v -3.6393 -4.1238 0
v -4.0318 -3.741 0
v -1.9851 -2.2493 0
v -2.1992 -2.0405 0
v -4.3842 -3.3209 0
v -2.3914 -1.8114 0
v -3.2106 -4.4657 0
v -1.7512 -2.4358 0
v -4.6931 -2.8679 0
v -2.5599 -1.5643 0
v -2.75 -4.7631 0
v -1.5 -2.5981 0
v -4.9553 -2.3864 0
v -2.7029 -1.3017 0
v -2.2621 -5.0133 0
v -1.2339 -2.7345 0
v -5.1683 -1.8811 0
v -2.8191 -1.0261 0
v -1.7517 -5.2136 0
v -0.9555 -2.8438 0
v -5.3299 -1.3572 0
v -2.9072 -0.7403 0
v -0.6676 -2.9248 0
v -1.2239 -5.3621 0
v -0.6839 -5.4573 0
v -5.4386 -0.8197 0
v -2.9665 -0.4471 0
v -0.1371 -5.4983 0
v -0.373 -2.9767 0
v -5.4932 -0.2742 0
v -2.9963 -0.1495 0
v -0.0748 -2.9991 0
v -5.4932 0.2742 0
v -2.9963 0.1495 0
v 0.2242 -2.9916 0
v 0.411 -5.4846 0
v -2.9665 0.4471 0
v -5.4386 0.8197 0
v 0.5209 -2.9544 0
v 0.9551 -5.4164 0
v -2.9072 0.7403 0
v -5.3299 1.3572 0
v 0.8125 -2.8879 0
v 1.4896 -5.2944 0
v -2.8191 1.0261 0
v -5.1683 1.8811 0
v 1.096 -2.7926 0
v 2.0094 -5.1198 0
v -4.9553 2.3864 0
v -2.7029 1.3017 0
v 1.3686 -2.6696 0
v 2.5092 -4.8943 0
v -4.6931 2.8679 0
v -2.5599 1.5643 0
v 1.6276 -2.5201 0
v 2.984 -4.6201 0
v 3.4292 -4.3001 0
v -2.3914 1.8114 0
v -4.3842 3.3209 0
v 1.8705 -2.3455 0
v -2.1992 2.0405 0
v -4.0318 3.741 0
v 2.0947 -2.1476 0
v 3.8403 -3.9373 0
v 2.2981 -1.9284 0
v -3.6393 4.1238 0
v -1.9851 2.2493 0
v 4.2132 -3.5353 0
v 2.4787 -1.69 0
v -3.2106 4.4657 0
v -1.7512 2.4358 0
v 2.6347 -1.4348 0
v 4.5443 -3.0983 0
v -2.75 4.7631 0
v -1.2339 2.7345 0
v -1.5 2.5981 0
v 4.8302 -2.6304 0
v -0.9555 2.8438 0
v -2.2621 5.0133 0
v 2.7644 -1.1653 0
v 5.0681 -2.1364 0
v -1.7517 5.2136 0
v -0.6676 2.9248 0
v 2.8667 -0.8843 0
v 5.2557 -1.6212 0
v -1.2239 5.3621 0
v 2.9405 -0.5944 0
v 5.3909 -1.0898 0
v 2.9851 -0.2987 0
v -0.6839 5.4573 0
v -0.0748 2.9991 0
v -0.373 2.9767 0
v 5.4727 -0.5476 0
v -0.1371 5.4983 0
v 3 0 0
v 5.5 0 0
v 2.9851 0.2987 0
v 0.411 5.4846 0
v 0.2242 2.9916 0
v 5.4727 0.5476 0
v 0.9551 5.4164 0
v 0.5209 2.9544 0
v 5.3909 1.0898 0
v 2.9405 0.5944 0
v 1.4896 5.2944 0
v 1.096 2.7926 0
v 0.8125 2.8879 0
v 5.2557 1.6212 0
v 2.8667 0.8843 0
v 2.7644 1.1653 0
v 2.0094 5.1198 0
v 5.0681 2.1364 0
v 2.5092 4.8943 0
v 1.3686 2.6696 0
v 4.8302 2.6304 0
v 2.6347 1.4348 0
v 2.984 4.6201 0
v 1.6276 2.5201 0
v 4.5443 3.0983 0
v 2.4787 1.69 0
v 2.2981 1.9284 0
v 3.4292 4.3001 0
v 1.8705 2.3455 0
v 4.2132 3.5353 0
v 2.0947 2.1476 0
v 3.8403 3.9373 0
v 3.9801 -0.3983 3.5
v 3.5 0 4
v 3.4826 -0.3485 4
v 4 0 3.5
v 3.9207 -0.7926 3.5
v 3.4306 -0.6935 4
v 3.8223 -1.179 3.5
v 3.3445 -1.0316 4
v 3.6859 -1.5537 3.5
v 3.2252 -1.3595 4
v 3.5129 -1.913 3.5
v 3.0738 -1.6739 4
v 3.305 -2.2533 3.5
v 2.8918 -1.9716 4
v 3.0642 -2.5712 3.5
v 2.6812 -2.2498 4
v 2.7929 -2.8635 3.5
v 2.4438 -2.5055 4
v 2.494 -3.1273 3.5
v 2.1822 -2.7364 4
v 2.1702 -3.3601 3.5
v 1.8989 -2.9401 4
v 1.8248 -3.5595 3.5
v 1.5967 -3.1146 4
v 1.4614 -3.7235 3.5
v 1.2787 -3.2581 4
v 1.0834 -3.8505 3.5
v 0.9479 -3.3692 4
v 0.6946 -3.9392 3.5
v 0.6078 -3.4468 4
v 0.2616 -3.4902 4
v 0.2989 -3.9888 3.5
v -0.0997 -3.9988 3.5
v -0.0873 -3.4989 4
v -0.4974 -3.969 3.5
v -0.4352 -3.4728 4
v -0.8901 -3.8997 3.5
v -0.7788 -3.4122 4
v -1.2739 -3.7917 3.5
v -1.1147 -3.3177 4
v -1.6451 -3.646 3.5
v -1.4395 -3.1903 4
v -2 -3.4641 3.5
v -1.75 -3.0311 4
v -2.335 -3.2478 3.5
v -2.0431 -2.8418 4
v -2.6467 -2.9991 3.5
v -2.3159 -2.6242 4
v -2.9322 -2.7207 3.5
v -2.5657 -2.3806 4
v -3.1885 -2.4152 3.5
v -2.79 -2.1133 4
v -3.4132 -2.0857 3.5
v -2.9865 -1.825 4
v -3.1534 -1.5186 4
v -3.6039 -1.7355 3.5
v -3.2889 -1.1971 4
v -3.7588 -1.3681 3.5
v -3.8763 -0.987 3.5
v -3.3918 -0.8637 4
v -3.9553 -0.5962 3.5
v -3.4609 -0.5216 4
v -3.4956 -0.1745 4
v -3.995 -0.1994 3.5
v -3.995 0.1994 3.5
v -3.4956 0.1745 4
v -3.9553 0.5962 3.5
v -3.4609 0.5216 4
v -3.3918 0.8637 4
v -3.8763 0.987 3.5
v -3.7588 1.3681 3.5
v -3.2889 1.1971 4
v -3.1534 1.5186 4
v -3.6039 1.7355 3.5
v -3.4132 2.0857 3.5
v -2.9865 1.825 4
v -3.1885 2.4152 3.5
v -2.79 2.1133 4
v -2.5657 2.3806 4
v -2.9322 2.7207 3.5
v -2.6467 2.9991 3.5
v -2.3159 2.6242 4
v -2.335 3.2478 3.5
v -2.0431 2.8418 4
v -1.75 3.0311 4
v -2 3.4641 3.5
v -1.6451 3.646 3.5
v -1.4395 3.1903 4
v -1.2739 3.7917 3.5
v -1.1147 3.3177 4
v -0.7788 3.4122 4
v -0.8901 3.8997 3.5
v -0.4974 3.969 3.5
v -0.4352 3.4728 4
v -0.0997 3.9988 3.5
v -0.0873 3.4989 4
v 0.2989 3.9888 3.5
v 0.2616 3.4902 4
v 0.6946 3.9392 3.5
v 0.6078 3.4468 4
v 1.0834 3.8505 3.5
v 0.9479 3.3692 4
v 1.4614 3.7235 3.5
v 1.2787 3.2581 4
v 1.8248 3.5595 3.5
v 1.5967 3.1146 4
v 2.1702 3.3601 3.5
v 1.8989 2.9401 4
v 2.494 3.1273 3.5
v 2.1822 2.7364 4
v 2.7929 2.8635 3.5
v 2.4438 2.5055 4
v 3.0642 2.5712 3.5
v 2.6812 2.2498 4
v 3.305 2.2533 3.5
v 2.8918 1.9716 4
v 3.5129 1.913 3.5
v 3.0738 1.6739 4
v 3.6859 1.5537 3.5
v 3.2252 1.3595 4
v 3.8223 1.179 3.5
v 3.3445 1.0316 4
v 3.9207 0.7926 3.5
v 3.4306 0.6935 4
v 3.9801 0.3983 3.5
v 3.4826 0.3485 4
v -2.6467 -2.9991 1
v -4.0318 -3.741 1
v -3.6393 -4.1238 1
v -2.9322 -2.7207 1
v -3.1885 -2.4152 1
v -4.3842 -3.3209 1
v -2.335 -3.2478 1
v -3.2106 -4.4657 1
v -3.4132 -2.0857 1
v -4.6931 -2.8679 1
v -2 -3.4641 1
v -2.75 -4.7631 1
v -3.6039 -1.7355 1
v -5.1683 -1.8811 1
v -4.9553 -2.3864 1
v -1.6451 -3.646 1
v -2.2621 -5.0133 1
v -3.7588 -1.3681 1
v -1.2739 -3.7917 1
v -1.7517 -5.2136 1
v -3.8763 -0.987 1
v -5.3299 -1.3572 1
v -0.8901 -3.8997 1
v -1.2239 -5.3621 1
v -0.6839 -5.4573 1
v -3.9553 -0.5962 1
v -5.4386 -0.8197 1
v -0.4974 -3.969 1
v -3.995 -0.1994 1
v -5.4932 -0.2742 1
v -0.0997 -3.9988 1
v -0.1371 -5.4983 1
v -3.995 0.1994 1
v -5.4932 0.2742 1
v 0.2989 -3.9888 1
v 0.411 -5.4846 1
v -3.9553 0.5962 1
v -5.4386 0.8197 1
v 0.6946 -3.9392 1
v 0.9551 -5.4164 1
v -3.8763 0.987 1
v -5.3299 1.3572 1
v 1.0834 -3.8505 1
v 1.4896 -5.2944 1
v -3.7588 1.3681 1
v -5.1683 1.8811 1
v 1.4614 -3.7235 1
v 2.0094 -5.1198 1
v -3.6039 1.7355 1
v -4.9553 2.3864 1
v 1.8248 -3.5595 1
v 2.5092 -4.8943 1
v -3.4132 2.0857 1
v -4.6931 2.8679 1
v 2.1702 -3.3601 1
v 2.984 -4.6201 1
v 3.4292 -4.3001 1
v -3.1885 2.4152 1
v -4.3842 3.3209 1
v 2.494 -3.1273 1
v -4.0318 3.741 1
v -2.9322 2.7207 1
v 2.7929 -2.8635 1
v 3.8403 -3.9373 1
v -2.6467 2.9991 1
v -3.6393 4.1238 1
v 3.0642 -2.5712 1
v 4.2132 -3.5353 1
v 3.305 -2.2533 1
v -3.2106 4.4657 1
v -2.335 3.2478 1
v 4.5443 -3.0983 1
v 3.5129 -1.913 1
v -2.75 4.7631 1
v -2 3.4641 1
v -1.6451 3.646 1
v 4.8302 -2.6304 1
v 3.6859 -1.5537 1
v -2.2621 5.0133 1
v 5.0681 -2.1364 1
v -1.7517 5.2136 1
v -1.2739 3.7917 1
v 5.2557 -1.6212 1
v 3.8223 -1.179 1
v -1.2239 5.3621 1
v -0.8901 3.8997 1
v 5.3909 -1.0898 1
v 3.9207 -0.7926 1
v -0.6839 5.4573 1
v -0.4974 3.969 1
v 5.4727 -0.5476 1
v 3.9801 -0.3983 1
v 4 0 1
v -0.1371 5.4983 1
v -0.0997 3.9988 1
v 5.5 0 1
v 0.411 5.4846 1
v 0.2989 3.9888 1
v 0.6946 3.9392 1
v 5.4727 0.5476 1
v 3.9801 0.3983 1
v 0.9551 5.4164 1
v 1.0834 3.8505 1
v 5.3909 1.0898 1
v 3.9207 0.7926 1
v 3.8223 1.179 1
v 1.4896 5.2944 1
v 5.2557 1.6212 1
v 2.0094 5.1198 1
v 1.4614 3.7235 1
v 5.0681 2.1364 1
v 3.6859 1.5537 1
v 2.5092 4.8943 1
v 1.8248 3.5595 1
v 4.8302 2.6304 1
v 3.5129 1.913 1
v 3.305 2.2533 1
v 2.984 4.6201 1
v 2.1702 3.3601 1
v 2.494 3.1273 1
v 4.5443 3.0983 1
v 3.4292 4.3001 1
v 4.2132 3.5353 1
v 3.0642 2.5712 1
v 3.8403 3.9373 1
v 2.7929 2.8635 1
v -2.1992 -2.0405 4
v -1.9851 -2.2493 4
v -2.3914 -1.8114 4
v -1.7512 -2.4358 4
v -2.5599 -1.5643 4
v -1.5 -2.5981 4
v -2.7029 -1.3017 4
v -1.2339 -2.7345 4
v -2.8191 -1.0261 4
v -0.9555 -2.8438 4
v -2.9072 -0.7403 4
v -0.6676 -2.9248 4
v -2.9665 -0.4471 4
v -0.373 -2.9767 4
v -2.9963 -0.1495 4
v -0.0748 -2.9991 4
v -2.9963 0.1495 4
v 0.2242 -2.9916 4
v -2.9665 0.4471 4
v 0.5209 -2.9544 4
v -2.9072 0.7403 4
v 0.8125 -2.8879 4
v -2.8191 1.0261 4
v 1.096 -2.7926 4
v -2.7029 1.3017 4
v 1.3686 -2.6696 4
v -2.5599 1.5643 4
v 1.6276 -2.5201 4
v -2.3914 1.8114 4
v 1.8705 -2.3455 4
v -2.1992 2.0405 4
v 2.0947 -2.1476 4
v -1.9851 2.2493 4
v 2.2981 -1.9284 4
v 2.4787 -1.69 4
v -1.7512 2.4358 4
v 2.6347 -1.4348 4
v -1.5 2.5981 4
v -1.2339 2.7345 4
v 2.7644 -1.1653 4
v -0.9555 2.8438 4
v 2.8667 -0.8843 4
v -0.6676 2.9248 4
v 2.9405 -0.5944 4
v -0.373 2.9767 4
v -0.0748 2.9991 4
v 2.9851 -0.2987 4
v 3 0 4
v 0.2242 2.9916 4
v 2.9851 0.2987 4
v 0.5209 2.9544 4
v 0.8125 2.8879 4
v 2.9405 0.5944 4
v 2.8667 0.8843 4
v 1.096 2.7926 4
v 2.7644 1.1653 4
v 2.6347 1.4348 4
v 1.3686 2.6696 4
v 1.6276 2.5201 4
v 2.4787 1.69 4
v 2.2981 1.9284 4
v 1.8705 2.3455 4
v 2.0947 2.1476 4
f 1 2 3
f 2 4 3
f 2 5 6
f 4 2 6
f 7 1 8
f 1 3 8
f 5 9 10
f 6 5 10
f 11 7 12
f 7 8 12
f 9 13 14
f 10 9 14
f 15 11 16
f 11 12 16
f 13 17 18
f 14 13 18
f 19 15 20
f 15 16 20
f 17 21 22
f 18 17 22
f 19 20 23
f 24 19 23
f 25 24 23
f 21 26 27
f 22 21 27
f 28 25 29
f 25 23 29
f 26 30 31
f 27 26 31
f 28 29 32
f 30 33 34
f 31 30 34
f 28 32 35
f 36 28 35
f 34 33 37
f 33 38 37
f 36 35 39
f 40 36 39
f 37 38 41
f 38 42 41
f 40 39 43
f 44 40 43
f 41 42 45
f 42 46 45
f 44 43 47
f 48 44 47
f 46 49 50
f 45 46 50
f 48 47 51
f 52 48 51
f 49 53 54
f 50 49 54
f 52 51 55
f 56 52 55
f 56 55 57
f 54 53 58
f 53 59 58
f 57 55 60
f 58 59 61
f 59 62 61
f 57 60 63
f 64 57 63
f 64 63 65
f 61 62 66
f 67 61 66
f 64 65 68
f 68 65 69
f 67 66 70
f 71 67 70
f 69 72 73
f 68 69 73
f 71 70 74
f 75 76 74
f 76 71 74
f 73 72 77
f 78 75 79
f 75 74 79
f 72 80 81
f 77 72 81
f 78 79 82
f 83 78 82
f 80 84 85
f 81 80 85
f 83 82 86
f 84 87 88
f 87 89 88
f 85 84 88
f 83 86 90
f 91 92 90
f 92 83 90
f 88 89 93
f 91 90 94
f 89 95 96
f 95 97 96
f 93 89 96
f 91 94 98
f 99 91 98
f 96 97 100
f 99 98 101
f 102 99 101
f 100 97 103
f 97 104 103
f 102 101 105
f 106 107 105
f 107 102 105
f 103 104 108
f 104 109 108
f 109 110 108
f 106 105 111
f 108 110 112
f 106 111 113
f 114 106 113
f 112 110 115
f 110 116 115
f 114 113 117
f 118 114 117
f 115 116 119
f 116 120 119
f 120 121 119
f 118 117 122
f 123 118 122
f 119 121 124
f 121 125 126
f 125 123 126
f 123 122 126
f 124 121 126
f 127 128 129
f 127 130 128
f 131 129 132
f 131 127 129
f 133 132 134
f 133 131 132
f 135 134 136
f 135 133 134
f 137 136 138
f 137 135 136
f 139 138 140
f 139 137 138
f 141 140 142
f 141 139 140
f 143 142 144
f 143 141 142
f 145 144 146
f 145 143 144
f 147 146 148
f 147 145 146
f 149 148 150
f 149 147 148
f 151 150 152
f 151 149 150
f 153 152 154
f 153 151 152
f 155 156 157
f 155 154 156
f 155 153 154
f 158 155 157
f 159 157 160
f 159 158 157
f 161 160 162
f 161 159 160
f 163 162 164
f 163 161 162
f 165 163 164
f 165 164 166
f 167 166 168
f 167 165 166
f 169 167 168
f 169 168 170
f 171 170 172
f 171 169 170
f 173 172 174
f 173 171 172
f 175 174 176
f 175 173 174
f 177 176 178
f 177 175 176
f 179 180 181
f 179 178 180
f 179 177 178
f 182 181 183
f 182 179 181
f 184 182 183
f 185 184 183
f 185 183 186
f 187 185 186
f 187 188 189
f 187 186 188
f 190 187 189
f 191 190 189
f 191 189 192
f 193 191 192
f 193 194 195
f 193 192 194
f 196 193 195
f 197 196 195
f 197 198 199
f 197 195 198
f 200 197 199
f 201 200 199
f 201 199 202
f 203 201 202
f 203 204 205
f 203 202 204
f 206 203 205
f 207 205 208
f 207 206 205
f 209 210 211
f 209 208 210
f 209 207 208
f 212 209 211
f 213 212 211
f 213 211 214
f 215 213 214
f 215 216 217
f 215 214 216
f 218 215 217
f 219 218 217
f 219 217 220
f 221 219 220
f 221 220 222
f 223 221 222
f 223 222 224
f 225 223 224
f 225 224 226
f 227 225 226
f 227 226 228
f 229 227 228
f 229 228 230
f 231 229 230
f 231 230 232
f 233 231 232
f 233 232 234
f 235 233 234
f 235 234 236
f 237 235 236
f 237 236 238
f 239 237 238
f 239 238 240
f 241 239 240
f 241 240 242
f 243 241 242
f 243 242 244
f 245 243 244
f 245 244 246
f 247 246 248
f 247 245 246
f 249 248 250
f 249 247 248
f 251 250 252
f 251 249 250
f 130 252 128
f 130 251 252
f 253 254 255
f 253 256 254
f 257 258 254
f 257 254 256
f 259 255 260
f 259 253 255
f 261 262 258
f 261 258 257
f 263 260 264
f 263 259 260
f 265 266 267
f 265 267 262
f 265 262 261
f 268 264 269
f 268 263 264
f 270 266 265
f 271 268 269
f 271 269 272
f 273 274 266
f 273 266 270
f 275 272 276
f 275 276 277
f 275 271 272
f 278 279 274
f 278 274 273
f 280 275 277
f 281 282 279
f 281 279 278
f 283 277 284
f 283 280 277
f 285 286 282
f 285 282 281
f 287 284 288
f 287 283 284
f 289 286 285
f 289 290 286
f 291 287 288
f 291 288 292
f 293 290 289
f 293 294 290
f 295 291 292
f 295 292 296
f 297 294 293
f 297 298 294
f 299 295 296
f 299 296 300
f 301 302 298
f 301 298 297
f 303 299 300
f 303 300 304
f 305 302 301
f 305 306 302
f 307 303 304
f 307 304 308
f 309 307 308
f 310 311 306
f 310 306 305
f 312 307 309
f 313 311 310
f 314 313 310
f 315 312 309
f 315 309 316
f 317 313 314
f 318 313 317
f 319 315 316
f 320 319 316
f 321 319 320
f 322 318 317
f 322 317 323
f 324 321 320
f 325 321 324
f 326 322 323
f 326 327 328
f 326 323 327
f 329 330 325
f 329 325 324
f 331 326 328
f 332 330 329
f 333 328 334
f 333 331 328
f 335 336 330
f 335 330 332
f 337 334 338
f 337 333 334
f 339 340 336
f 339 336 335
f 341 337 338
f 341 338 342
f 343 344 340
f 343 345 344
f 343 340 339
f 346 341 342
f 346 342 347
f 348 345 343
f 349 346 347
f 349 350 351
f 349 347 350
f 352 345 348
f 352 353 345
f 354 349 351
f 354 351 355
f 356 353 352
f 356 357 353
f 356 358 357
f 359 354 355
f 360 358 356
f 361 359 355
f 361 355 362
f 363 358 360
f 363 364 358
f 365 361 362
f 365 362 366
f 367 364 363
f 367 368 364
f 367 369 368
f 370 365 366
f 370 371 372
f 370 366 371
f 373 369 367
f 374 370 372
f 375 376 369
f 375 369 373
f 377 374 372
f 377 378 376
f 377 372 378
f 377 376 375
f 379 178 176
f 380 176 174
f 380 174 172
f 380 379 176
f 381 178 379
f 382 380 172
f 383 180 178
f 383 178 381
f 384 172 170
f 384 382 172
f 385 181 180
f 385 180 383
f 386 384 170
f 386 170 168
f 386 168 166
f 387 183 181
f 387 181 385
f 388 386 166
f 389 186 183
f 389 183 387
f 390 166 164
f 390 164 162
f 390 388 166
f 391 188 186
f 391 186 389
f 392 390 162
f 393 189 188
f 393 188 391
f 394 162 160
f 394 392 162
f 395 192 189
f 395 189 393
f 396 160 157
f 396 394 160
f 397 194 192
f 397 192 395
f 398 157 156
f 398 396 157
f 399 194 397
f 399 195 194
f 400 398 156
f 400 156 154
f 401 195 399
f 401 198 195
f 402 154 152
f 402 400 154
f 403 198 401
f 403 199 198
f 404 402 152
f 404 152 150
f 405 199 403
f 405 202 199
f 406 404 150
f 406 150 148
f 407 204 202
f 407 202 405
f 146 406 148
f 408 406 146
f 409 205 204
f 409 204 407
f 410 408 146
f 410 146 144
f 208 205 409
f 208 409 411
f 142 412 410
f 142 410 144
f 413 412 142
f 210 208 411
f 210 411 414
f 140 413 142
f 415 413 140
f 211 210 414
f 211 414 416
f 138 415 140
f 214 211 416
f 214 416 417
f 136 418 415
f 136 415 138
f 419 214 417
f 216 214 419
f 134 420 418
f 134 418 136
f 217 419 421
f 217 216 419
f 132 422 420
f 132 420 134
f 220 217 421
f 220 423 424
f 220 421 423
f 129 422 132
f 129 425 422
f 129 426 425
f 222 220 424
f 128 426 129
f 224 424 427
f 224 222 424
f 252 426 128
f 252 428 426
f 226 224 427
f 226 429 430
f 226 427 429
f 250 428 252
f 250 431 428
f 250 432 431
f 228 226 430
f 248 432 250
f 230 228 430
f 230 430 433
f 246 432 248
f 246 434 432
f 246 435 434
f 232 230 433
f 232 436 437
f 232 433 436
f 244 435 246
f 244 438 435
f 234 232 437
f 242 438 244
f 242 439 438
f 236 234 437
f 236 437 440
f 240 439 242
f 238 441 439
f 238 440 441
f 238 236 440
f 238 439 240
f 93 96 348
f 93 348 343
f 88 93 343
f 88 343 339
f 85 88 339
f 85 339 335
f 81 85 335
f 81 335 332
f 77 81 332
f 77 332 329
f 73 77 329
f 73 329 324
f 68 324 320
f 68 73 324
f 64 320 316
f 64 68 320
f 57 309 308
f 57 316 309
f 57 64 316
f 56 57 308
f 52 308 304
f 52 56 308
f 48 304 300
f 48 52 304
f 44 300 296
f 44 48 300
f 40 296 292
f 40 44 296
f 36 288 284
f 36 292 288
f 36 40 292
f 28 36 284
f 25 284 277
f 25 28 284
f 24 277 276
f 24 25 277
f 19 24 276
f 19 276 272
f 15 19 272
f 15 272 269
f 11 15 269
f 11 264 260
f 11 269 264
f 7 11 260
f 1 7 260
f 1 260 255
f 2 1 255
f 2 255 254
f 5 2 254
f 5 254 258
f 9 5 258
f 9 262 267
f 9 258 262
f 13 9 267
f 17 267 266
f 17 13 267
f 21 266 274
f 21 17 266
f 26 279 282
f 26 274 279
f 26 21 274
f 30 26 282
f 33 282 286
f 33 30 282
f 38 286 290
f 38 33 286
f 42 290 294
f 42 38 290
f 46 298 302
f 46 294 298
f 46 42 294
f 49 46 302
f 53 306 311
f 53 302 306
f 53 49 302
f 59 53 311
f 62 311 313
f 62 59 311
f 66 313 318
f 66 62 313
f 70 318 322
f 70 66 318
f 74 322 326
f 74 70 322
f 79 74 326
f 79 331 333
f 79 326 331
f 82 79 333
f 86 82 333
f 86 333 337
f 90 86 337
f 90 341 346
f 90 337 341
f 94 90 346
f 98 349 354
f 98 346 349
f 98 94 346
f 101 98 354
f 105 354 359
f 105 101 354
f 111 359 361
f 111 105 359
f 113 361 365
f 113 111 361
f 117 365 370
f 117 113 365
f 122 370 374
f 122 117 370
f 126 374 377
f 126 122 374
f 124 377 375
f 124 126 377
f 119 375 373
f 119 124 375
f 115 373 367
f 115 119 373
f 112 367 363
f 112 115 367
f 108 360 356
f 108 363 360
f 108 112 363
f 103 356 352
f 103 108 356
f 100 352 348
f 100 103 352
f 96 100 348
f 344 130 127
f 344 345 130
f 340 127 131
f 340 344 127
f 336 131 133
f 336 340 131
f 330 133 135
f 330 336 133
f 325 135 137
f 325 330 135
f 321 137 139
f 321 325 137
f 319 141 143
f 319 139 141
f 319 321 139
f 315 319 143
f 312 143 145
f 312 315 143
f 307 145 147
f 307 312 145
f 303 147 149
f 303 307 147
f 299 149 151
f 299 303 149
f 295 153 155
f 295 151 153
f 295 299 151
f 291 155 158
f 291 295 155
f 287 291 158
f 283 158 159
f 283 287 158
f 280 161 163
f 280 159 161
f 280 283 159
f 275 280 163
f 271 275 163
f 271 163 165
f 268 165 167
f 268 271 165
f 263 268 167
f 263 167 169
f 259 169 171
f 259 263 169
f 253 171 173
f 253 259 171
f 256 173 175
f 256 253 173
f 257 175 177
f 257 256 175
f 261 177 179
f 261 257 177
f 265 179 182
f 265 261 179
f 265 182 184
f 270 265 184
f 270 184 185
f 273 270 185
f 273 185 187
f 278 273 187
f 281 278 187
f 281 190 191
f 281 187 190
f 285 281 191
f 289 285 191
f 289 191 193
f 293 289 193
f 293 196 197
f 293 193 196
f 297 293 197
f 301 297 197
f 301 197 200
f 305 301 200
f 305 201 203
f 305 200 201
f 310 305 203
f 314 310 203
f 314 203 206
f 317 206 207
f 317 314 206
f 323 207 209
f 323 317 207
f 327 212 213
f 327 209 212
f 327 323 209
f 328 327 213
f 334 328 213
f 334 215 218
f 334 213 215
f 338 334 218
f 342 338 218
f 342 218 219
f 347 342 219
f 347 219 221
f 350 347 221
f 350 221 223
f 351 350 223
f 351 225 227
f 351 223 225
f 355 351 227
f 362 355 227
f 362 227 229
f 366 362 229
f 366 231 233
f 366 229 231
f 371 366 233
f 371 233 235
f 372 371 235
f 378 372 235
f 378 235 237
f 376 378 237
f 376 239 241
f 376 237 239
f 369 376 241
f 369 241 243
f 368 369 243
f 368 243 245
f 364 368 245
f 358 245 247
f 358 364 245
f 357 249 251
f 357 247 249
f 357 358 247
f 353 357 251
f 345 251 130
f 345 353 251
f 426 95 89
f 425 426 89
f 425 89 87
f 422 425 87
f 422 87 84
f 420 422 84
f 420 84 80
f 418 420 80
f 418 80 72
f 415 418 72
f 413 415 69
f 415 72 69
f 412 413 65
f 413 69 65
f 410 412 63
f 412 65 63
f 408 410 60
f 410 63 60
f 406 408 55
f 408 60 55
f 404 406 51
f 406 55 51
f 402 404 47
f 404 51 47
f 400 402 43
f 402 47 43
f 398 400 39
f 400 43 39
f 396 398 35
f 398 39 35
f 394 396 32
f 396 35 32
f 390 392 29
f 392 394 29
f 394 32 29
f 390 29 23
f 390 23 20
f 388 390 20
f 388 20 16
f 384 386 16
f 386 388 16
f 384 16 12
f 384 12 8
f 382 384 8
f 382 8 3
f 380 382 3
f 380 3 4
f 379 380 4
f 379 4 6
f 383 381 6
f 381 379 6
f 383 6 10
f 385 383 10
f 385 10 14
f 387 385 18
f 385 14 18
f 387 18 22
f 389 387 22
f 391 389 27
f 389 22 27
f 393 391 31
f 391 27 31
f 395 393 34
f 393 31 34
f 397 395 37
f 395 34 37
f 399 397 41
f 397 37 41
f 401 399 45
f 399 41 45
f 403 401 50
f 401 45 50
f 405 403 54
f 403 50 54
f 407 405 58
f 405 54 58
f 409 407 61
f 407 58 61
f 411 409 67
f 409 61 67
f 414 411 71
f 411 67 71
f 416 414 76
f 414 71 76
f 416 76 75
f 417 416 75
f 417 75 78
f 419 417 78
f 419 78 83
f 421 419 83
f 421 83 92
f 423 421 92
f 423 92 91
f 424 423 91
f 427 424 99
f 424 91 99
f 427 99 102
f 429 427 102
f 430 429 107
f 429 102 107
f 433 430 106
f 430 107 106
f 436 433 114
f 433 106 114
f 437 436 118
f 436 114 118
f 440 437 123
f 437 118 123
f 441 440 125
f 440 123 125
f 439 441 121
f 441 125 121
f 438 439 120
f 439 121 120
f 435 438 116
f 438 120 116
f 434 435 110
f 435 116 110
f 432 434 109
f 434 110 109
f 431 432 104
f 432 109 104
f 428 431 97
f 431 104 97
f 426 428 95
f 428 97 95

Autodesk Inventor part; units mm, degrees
ref_plane "YZ Plane" through (0, 0, 0) normal (1, 0, 0) x (0, 1, 0)
ref_plane "XZ Plane" through (0, 0, 0) normal (0, 1, 0) x (-1, 0, 0)
ref_plane "XY Plane" through (0, 0, 0) normal (0, 0, 1) x (1, 0, 0)
sketch "スケッチ1" plane through (0, 0, 0) normal (0, 0, 1) x (1, 0, 0)
  circle A0 centre (0, 0) radius 5.5
  circle A1 centre (0, 0) radius 3
  dimension "d0" = 11
  dimension "d1" = 6
extrude "押し出し1" add sketch "スケッチ1" along normal blind 1
sketch "スケッチ2" plane through (0, 0, 1) normal (0, 0, 1) x (1, 0, 0)
  circle A0 centre (0, 0) radius 4
  circle A1 centre (0, 0) radius 3 projected
  dimension "d4" = 8
extrude "押し出し2" add sketch "スケッチ2" along normal blind 3
chamfer "面取り1" distance 0.5 angle 45 1 edges at (-4, 0, 4)
properties part number "オイレス6-10" material "アセタール樹脂、黒"
